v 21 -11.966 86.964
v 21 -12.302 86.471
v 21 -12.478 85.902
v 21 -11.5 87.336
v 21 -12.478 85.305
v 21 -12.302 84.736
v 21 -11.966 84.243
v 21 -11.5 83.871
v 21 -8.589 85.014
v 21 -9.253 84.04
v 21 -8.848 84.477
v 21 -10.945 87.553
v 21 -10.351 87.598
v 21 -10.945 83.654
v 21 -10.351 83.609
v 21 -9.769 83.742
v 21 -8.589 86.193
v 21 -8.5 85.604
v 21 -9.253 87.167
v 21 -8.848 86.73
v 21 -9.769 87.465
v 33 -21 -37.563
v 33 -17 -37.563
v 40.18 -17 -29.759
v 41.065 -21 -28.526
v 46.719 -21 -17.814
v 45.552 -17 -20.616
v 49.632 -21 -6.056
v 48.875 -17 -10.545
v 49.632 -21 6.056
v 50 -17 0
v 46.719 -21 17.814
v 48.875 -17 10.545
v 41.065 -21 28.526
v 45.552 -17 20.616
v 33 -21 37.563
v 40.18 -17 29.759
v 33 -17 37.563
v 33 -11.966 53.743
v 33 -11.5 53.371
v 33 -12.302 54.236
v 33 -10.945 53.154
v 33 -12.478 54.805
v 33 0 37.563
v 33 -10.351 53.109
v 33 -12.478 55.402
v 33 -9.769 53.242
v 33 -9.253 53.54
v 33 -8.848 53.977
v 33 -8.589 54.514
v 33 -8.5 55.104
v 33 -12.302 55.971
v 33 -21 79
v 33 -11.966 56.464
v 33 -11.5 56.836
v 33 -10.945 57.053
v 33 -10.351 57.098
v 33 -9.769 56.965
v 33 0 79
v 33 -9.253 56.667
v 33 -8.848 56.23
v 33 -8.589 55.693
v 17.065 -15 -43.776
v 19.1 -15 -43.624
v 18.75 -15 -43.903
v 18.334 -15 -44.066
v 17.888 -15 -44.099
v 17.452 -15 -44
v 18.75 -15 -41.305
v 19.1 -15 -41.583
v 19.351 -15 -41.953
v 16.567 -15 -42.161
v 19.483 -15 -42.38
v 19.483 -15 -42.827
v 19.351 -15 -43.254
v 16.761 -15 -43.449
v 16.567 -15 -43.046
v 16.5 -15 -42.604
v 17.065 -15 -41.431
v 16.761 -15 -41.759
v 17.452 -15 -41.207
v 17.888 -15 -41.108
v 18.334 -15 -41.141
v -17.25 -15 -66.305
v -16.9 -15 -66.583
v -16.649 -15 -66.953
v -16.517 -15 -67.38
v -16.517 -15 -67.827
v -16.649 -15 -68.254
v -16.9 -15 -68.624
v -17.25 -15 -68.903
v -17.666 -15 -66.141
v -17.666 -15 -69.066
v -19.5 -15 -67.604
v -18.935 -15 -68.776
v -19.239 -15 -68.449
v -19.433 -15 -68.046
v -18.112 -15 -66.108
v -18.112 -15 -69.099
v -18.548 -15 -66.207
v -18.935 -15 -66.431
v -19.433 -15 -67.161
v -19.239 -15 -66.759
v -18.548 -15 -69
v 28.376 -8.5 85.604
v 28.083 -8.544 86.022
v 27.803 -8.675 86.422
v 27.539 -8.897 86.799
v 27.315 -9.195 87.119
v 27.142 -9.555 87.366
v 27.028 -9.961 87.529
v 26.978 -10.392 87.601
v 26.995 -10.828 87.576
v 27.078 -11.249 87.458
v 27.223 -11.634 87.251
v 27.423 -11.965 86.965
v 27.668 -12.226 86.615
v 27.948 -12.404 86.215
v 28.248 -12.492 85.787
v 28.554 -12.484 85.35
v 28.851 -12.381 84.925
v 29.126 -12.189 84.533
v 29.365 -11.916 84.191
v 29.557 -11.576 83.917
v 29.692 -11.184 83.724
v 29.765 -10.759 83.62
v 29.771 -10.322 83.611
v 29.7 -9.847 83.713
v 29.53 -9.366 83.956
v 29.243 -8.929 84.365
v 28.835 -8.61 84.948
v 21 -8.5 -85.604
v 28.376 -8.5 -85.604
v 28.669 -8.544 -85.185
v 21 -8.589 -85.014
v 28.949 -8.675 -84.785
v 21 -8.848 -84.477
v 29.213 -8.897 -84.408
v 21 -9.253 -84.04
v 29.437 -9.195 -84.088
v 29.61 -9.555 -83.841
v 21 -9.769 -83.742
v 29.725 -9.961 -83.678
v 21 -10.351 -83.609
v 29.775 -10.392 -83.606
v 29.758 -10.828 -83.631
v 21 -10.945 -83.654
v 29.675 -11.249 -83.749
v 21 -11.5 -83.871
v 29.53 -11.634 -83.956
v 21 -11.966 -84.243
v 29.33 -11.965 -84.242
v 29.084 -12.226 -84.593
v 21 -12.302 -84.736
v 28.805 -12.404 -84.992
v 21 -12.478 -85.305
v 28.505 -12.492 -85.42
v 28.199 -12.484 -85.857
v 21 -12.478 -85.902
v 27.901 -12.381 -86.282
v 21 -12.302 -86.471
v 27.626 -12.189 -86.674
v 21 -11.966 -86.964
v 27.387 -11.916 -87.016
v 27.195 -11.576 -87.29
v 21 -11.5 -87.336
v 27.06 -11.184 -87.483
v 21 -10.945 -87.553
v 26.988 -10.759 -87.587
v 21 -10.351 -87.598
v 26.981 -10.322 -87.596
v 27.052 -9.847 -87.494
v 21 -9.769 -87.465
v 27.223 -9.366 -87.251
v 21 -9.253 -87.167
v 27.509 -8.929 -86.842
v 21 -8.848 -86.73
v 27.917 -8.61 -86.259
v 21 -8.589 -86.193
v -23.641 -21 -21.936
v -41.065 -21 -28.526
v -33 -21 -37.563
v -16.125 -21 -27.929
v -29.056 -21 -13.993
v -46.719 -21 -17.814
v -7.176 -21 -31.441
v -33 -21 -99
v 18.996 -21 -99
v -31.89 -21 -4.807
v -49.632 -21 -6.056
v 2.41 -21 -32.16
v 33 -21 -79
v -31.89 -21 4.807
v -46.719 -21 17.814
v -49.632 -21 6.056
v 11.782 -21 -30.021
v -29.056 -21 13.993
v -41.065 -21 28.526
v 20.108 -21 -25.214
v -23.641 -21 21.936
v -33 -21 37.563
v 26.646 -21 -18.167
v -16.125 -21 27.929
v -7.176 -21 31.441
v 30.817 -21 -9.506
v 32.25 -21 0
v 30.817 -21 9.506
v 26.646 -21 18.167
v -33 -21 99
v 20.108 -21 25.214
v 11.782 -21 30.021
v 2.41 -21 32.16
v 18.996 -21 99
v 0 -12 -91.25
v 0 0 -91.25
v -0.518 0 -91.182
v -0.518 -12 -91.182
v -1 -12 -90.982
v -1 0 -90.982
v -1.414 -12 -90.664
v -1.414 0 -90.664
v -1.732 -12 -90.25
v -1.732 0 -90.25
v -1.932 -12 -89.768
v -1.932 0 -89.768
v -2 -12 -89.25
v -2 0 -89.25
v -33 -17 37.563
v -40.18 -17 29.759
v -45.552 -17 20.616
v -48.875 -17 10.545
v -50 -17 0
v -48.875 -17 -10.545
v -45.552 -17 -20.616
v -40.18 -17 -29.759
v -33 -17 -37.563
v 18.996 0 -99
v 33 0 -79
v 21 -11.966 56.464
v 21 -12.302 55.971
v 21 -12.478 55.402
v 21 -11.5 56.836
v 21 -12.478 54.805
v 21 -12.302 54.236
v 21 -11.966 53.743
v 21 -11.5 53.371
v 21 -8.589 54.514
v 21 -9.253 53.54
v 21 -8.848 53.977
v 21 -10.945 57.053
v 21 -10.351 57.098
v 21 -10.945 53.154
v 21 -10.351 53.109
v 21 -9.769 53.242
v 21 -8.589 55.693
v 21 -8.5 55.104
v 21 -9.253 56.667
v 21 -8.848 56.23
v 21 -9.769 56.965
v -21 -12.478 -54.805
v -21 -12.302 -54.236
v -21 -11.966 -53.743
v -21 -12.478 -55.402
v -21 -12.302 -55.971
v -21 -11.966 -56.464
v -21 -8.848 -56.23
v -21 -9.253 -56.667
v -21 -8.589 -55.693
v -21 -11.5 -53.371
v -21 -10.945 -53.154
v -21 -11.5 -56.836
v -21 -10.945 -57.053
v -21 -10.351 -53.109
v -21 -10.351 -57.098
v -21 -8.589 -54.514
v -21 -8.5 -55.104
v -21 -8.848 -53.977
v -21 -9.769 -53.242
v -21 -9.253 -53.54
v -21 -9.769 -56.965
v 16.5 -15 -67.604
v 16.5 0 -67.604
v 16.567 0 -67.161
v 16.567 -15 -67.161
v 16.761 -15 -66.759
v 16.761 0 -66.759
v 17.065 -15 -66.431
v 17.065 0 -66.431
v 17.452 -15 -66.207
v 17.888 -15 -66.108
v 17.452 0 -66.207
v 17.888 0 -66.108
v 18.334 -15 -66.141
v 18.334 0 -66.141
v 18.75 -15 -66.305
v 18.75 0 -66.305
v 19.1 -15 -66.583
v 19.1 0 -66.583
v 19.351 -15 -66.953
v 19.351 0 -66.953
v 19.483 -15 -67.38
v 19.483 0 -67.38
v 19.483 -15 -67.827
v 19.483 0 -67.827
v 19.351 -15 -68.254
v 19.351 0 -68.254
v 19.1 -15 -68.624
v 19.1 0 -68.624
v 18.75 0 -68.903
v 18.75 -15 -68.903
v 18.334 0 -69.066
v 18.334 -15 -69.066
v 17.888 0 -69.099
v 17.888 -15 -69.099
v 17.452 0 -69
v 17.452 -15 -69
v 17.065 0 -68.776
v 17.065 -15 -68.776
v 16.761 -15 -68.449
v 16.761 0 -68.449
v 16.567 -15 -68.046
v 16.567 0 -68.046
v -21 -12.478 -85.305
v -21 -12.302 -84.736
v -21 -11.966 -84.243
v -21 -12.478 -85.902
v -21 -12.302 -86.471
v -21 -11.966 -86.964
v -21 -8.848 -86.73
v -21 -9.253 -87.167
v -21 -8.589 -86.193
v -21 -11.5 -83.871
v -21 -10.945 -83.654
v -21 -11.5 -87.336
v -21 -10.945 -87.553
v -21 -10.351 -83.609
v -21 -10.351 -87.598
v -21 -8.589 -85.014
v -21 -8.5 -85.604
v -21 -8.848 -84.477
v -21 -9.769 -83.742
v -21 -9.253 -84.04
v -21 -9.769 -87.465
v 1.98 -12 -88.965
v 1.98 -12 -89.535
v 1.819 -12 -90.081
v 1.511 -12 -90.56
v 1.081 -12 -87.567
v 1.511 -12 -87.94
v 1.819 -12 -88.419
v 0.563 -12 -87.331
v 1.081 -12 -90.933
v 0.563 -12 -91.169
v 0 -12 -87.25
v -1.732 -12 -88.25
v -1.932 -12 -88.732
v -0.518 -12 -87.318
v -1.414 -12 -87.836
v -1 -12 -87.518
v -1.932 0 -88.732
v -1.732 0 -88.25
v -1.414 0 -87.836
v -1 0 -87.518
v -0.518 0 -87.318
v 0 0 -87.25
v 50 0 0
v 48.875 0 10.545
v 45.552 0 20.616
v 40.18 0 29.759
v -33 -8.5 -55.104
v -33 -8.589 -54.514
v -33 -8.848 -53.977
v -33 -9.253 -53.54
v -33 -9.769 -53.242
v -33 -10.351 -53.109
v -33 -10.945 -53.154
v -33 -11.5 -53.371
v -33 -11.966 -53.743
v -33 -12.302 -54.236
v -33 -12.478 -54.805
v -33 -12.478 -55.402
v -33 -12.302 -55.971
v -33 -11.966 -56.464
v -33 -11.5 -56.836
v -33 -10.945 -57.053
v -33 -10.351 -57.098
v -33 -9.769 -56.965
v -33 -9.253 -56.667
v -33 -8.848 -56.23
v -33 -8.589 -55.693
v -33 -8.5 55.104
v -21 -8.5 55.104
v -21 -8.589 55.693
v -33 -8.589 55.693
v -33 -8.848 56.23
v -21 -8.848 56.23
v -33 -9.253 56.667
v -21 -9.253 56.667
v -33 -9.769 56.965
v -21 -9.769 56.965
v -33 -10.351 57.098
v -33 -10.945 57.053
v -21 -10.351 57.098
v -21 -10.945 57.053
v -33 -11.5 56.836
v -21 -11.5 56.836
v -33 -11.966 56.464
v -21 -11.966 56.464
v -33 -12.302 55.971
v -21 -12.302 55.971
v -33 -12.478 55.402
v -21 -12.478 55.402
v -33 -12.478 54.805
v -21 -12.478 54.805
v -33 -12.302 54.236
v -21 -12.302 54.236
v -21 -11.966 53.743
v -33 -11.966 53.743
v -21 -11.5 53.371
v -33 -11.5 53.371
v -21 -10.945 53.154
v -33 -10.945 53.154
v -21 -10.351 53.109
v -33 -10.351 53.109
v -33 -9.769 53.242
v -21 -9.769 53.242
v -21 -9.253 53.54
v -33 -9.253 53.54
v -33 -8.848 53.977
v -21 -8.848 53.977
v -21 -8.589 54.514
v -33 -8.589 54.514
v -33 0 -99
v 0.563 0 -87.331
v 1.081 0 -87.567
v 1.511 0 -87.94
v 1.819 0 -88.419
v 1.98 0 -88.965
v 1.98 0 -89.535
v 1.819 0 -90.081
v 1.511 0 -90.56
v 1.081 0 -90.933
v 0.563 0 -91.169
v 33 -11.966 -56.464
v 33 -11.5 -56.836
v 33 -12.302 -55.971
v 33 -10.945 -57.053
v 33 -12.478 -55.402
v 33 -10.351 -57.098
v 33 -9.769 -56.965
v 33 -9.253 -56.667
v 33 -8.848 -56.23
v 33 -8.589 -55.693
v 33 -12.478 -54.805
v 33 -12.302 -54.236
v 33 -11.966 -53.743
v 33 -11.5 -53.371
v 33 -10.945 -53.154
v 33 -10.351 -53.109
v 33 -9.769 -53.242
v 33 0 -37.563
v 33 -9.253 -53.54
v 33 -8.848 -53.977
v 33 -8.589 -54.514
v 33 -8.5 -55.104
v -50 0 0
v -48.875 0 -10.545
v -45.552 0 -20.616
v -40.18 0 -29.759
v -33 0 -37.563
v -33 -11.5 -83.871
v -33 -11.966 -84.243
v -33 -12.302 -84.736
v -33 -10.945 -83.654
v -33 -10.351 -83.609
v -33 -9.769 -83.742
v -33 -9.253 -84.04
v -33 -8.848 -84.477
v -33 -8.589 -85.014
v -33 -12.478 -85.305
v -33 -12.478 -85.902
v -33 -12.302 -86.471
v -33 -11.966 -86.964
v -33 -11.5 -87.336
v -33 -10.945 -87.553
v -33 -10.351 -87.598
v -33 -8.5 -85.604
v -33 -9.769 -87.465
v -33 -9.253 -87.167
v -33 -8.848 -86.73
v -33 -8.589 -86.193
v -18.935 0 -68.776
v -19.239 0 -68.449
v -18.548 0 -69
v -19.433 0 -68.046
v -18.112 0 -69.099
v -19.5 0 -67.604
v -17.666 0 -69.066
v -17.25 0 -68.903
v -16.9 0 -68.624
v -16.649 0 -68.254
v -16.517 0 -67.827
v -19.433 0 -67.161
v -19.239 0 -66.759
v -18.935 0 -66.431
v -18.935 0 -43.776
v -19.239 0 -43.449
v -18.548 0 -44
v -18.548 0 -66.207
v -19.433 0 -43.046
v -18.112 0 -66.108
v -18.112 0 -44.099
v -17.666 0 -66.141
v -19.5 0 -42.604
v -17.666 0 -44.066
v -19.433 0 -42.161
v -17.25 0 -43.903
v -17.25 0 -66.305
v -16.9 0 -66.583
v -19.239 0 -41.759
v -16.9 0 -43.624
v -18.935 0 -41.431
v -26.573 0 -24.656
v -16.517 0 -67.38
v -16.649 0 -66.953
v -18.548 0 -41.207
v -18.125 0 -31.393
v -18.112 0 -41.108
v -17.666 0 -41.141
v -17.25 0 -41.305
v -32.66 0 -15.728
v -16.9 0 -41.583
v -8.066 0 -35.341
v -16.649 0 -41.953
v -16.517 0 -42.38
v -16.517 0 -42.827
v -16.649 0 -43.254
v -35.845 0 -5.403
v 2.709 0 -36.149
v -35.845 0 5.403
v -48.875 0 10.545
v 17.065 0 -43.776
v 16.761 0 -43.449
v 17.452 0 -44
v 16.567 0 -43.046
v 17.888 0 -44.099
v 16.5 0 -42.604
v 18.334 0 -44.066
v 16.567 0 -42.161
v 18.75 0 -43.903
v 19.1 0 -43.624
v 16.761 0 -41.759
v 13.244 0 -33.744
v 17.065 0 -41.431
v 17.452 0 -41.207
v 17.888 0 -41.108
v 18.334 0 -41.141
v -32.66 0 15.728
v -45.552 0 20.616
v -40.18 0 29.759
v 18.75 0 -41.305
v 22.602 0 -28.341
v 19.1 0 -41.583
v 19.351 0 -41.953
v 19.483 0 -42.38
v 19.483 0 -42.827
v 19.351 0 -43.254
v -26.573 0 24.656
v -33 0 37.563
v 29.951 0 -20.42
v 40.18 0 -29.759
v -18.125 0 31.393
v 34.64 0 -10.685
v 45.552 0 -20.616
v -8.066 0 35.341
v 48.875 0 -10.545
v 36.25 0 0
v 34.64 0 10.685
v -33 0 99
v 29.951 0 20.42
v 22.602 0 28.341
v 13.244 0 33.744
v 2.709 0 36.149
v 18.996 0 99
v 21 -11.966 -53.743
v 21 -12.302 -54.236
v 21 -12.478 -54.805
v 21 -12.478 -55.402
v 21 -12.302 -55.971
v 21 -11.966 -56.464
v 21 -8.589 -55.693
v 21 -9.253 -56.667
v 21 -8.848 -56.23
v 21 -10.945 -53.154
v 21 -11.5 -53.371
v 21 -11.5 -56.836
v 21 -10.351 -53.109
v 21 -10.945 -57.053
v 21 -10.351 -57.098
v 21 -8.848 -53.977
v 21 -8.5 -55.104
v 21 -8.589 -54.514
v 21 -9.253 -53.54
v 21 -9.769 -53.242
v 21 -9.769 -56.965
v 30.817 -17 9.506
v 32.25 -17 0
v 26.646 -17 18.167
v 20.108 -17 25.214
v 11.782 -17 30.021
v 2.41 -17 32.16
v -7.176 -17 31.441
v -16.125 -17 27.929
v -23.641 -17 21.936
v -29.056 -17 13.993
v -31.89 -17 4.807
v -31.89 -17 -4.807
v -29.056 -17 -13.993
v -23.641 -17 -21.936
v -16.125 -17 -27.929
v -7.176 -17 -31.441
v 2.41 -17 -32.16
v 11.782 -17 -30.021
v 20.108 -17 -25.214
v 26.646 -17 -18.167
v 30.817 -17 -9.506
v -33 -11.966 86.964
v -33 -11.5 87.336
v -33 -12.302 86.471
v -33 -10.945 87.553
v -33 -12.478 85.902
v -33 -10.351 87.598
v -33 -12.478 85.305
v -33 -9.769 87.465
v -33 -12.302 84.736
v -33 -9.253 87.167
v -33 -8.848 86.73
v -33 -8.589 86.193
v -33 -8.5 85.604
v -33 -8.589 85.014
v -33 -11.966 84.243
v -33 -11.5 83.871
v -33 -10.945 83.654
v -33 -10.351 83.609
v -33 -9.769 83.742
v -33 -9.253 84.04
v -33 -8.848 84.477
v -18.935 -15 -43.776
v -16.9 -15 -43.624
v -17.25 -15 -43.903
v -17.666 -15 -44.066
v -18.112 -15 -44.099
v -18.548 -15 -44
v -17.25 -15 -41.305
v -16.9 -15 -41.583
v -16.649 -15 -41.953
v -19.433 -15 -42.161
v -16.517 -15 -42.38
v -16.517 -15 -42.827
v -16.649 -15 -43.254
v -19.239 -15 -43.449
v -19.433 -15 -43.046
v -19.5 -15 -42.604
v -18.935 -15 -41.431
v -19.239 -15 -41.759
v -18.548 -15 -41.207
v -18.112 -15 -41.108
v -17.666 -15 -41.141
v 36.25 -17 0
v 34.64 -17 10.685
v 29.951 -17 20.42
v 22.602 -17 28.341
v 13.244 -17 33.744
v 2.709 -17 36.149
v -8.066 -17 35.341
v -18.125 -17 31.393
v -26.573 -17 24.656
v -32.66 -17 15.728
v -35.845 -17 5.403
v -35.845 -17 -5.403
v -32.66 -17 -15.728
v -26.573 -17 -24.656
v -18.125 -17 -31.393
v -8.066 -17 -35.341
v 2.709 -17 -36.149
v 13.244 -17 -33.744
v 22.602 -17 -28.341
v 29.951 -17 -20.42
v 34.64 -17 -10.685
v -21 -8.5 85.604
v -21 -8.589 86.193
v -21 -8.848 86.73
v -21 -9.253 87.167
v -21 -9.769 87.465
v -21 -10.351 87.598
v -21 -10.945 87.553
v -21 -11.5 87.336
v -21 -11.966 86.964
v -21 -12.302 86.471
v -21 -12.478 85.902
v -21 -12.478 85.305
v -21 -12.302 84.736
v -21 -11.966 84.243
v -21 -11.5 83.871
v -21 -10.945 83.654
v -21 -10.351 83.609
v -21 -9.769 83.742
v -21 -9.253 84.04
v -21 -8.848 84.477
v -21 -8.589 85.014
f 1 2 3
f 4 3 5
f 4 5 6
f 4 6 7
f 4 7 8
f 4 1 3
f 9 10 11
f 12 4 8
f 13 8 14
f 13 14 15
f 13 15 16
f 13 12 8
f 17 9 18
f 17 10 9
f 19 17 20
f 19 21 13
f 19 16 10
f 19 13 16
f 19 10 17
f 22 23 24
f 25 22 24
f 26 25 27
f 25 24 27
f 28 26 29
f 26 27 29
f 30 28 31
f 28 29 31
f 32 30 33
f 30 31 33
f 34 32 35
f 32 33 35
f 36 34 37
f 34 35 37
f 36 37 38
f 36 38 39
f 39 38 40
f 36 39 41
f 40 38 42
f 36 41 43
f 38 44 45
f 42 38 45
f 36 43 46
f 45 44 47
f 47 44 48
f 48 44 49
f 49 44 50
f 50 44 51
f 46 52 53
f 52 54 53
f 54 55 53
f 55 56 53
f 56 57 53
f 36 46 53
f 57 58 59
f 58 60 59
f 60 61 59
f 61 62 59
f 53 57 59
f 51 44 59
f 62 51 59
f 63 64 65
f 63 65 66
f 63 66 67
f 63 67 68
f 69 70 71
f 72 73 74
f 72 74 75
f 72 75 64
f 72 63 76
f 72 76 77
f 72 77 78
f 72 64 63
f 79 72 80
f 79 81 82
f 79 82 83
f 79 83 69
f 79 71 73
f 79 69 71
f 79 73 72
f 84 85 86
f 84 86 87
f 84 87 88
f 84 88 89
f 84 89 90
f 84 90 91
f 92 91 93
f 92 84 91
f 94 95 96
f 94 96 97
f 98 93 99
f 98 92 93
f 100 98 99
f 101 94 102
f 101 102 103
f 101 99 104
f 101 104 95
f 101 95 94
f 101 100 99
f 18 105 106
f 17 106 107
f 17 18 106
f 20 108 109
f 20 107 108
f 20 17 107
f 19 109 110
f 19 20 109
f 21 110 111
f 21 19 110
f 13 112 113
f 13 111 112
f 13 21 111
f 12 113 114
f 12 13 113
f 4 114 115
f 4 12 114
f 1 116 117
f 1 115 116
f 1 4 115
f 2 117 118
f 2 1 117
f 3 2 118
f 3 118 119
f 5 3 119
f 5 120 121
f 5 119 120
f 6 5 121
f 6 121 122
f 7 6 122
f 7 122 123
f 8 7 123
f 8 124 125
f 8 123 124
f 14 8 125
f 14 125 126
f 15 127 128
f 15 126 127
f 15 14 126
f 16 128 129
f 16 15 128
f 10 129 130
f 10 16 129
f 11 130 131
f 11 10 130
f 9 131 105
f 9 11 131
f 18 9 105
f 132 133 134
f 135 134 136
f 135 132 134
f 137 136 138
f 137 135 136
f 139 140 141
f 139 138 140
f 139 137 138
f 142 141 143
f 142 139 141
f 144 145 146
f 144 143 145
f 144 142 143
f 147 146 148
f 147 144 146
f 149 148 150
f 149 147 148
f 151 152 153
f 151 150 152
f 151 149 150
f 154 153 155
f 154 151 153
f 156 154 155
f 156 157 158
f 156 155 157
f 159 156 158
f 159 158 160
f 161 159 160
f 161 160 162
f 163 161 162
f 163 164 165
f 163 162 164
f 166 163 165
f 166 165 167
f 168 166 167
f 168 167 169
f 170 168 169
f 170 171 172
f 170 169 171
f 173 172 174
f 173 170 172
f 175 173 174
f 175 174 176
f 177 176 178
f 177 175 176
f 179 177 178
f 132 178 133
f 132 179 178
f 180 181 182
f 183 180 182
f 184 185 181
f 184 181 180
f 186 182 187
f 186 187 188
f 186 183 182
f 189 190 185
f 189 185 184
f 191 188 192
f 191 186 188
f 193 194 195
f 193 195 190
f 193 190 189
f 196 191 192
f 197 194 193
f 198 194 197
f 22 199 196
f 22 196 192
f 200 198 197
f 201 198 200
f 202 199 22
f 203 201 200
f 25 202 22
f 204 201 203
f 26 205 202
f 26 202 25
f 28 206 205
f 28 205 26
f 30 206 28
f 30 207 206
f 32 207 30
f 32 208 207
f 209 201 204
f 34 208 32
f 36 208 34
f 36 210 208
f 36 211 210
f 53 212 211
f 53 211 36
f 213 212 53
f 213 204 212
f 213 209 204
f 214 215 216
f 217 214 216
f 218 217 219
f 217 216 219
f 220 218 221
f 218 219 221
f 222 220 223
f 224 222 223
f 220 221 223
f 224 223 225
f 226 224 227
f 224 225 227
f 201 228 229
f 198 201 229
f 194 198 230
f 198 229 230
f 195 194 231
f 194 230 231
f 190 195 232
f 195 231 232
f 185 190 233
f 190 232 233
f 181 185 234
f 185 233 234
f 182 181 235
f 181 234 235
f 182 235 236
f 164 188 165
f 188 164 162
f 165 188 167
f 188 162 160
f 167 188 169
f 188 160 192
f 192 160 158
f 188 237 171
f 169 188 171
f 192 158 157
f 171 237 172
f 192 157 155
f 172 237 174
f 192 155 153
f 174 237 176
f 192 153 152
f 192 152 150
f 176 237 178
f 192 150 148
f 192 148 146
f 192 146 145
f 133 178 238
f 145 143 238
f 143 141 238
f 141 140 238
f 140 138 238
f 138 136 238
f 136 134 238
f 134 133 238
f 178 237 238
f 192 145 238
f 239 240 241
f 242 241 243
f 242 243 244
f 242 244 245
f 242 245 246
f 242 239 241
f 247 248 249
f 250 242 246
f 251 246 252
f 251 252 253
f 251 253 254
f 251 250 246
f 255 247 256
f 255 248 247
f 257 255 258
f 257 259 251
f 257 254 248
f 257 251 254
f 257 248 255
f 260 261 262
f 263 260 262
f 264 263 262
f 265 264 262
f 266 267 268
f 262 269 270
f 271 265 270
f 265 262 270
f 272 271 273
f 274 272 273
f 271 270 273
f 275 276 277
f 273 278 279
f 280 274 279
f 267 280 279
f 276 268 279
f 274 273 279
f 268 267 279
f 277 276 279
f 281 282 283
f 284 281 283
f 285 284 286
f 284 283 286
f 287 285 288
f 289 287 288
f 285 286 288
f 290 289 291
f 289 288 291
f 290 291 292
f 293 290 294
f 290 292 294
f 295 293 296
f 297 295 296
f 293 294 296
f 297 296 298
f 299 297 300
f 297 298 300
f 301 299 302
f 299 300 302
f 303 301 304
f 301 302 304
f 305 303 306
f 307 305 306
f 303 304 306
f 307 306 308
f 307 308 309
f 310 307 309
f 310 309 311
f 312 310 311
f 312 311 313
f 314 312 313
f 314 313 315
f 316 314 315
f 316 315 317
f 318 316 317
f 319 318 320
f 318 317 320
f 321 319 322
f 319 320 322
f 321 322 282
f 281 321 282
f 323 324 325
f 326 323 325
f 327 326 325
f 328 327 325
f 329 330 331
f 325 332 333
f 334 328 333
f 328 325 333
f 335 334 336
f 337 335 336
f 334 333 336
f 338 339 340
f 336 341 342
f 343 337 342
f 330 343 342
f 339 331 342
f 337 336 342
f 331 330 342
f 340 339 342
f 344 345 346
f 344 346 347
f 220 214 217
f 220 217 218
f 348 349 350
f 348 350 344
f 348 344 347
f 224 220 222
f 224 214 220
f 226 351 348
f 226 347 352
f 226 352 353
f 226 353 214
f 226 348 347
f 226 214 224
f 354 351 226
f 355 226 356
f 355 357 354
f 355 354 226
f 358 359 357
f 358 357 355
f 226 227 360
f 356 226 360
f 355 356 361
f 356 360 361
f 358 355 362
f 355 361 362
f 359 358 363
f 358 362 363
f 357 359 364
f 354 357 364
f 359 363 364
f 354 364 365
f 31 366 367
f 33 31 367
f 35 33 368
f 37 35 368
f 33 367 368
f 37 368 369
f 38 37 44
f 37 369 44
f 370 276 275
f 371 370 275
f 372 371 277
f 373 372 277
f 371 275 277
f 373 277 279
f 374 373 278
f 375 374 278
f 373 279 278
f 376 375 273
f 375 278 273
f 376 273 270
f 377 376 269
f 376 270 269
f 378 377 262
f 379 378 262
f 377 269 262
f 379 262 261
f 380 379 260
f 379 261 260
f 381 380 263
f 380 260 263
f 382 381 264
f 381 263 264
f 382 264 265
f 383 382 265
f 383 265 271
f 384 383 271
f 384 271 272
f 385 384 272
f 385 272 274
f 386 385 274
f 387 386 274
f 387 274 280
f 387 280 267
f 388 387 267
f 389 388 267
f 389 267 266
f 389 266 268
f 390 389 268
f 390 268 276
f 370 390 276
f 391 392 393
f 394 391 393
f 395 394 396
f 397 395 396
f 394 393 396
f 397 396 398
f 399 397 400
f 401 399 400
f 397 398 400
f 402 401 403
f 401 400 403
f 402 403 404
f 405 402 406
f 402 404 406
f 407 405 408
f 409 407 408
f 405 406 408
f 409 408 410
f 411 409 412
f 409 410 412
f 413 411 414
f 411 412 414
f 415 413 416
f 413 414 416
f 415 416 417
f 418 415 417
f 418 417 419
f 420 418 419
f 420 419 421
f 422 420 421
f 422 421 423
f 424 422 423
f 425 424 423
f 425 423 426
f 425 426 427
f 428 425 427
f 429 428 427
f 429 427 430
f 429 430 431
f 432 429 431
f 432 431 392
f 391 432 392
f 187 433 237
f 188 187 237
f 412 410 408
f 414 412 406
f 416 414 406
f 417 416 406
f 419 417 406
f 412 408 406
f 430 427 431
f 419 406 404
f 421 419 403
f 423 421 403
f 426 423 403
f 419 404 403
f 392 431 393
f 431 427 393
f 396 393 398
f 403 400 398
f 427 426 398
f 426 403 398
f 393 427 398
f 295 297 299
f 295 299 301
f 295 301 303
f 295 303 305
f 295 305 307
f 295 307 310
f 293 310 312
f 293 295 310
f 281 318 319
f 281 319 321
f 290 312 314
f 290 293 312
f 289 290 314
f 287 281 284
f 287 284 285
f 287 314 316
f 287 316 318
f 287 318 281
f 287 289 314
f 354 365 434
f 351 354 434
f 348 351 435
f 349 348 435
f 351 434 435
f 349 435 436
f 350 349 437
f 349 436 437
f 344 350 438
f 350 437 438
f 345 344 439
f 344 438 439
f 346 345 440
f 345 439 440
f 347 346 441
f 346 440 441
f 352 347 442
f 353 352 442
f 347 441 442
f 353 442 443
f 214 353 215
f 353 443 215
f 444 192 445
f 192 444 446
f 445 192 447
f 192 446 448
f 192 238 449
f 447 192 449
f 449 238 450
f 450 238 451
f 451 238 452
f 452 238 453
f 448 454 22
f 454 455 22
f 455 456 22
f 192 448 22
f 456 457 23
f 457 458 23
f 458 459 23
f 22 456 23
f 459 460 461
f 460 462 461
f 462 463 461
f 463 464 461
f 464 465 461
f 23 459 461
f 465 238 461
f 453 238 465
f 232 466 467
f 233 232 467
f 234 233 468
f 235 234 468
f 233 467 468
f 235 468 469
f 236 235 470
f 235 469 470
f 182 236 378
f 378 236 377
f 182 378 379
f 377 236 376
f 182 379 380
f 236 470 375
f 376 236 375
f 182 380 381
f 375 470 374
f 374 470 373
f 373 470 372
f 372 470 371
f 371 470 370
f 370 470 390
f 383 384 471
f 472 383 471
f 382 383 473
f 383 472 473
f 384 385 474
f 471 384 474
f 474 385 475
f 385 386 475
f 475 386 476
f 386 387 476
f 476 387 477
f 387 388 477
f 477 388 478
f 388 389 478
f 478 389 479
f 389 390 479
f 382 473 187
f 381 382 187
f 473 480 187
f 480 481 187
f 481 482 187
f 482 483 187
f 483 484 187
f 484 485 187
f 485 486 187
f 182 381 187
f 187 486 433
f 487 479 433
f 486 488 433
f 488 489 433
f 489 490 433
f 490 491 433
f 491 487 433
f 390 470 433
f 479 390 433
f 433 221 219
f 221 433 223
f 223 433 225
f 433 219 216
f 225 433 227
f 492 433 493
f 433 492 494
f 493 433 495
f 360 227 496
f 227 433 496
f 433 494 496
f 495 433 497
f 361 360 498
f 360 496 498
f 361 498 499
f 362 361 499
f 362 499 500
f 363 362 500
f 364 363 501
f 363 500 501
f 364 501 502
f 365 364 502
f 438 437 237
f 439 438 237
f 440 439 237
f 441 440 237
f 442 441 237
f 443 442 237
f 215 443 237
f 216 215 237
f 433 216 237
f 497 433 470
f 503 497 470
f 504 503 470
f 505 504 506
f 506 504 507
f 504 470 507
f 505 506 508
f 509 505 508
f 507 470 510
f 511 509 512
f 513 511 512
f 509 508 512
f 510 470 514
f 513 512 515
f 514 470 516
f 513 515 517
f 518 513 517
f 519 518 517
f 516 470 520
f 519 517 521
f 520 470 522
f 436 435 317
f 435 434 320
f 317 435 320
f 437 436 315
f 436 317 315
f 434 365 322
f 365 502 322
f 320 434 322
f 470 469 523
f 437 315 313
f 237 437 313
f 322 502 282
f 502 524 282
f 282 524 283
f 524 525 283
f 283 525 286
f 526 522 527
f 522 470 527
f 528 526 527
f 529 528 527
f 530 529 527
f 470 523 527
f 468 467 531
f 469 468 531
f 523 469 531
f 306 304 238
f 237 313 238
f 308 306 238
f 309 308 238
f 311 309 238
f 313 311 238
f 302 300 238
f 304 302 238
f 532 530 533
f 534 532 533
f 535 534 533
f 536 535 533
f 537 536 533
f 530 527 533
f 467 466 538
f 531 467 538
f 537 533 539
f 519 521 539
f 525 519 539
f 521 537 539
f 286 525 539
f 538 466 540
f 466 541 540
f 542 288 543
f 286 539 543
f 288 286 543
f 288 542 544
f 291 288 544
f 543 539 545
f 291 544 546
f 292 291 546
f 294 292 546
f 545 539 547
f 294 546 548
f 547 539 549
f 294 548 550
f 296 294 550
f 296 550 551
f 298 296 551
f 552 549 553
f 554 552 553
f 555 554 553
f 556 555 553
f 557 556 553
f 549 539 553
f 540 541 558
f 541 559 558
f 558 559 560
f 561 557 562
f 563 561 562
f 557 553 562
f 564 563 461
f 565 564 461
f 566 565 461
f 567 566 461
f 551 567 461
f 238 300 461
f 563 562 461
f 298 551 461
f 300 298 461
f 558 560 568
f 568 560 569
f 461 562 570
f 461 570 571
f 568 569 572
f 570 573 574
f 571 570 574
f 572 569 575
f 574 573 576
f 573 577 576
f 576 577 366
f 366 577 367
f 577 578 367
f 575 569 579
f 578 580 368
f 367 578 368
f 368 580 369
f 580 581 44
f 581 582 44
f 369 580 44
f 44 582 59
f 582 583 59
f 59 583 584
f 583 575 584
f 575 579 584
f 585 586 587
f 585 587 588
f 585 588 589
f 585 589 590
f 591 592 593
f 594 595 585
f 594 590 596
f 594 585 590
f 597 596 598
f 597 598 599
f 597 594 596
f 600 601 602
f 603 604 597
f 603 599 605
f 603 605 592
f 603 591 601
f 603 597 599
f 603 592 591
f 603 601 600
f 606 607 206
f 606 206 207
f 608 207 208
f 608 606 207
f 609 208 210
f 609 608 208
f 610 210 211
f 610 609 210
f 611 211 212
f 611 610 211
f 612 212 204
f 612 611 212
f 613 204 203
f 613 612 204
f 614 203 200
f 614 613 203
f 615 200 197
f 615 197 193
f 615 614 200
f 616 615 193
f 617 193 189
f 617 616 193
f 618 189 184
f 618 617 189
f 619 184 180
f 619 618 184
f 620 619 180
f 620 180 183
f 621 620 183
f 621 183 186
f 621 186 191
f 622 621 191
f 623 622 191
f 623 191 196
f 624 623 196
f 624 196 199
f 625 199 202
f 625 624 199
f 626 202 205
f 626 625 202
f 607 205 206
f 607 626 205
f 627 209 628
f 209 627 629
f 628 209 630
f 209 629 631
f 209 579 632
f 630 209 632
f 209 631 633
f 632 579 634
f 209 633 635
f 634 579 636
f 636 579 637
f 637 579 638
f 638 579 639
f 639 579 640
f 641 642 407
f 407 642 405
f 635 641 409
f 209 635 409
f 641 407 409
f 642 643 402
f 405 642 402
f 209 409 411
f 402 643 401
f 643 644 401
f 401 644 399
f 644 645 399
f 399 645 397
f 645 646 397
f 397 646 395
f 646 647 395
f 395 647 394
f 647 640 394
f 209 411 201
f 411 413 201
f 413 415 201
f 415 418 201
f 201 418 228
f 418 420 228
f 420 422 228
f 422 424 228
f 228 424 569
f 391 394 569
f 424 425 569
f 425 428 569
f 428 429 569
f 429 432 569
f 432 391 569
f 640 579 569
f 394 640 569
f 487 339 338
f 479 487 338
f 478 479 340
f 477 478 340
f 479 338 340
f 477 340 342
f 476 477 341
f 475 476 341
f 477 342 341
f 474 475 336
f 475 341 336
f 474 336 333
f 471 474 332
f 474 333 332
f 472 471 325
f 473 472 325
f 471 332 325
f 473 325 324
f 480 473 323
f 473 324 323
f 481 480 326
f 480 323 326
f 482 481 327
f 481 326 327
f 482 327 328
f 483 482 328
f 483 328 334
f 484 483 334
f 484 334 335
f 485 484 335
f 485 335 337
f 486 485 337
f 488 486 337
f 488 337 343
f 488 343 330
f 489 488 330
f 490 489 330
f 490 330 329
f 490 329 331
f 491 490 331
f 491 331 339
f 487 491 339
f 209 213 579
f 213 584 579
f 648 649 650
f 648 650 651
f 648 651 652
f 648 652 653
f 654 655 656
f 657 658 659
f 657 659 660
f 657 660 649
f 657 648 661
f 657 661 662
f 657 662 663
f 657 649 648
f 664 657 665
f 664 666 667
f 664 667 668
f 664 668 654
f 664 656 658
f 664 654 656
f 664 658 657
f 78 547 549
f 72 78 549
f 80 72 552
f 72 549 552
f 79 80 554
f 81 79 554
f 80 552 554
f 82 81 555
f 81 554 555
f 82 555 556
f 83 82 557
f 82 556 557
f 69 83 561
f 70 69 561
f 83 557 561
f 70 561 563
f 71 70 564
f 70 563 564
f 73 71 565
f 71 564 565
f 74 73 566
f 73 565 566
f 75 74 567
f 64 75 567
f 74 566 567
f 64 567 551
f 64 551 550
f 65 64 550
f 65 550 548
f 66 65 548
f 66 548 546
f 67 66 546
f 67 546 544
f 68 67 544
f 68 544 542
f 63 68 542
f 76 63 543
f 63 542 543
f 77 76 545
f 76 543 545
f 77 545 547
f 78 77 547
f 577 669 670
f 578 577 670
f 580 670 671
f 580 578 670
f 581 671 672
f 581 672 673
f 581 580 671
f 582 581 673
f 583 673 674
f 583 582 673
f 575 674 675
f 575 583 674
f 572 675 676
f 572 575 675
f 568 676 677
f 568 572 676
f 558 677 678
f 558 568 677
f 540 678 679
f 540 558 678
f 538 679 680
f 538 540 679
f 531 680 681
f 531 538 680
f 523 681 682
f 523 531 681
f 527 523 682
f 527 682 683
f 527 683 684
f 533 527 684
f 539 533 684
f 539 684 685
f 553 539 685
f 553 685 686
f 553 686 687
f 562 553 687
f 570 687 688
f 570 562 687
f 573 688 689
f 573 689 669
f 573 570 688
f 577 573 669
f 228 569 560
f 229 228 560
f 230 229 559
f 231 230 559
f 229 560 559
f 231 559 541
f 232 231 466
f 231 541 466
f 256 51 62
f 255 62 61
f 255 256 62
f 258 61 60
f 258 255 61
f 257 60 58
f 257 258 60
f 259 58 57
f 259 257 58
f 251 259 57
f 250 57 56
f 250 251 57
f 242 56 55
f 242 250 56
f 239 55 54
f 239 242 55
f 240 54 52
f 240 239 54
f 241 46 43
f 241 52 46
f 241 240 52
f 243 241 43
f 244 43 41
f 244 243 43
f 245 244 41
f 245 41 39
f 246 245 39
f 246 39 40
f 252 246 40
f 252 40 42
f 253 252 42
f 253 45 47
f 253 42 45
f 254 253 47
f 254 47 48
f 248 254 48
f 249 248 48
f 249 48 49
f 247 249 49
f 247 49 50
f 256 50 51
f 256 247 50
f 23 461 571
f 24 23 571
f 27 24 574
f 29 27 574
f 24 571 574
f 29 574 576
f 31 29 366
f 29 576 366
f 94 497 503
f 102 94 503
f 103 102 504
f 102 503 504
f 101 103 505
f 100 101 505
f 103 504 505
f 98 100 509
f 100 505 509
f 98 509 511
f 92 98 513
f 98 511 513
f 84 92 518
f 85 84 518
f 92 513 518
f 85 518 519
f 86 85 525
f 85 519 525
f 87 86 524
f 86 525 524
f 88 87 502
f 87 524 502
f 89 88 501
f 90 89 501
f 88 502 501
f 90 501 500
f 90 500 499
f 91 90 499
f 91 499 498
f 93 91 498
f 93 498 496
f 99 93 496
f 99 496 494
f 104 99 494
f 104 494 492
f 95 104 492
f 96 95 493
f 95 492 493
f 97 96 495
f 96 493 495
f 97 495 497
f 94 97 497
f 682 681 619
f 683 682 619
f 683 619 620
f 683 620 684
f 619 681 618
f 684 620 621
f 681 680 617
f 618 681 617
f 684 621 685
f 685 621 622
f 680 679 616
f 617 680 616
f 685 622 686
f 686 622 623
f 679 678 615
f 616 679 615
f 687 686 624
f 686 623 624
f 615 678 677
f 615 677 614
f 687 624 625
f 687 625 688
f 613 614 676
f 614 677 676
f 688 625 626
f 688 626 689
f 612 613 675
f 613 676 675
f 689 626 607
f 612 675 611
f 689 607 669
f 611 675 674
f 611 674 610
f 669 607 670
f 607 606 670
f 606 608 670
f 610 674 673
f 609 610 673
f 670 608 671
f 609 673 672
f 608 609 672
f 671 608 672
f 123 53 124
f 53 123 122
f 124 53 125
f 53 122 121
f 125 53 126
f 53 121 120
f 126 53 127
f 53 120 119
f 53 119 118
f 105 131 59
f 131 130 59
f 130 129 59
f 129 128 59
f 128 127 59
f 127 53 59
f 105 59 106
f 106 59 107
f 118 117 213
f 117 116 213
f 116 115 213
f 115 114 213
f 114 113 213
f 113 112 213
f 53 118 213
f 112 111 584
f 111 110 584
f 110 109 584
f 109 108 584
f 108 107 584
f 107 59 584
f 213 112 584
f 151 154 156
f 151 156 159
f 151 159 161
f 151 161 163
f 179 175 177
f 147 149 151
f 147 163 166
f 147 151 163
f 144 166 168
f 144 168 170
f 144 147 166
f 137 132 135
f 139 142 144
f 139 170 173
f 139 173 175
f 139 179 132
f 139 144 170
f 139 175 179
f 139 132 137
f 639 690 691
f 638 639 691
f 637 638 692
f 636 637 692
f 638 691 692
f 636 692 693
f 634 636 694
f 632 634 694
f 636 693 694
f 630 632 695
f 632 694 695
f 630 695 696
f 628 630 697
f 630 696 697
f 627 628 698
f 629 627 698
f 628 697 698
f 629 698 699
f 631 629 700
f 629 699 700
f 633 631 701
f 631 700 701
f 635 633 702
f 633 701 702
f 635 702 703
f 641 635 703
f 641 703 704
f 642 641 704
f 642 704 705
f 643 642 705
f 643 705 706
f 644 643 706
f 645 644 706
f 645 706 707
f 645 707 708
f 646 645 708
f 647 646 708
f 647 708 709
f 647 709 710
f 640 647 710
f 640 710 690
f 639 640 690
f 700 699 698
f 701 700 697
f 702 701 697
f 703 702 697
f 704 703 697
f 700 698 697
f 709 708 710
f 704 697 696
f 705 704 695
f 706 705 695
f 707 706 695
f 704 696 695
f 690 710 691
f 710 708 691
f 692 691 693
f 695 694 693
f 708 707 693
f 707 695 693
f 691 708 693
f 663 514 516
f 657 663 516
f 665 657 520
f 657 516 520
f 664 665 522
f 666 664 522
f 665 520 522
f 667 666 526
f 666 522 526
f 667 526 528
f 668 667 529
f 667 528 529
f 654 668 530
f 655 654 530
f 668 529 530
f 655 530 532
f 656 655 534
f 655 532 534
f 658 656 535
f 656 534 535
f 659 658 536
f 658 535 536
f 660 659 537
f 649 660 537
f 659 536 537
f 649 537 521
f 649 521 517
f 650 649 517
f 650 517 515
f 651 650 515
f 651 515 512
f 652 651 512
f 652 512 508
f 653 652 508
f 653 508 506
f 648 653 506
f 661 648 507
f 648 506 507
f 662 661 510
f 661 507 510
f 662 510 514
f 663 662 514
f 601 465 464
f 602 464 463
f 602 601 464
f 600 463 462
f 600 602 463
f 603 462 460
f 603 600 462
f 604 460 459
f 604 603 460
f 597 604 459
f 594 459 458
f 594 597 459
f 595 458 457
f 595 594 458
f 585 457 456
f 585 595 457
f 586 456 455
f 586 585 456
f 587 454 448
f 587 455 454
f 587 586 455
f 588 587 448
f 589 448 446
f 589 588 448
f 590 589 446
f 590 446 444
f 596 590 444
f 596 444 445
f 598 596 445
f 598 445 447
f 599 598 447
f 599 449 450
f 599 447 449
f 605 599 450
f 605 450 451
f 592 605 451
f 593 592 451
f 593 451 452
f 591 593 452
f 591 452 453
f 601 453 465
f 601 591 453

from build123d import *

# Parameters (mm, degrees)
F0_R      = 36.25
F1_DEPTH  = 17
F2_R      = 32.25
F3_DEPTH  = 4
F4_R      = 1.5
F5_DEPTH  = 15
F7_R      = 2
F8_DEPTH  = 25
F10_R     = 2
F11_DEPTH = 25
F13_DEPTH = 12


with BuildPart() as f1:
    # F0 (on Front) → F1 (new body)
    with BuildSketch(Plane.XZ):
        Circle(F0_R)
        with BuildLine():
            Line((-33, -99), (-18.995849, -99))
            Line((-18.995849, -99), (0, -99))
            Line((0, -99), (18.995849, -99))
            Line((18.995849, -99), (33, -79))
            Line((33, -79), (33, -37.56328))
            ThreePointArc((33, -37.56328), (45.552168, -20.615528), (50, 0))
            ThreePointArc((50, 0), (45.552168, 20.615528), (33, 37.56328))
            Line((33, 37.56328), (33, 79))
            Line((33, 79), (18.995849, 99))
            Line((18.995849, 99), (-18.995849, 99))
            Line((-18.995849, 99), (-33, 99))
            Line((-33, 99), (-33, 79))
            Line((-33, 79), (-33, 37.56328))
            ThreePointArc((-33, 37.56328), (-45.552168, 20.615528), (-50, 0))
            ThreePointArc((-50, 0), (-45.552168, -20.615528), (-33, -37.56328))
            Line((-33, -37.56328), (-33, -79))
            Line((-33, -79), (-33, -99))
        make_face()
        Circle(F0_R, mode=Mode.SUBTRACT)
    extrude(amount=F1_DEPTH)

    # F2 (on face) → F3 (join)
    with BuildSketch(Plane.XZ.offset(17)):
        with BuildLine():
            Line((33, -79), (33, -37.56328))
            ThreePointArc((33, -37.56328), (50, 0), (33, 37.56328))
            Line((33, 37.56328), (33, 79))
            Line((33, 79), (18.995849, 99))
            Line((18.995849, 99), (-33, 99))
            Line((-33, 99), (-33, 37.56328))
            ThreePointArc((-33, 37.56328), (-50, 0), (-33, -37.56328))
            Line((-33, -37.56328), (-33, -99))
            Line((-33, -99), (18.995849, -99))
            Line((18.995849, -99), (33, -79))
        make_face()
        Circle(F2_R, mode=Mode.SUBTRACT)
    extrude(amount=F3_DEPTH)

    # F4 (on face) → F5 (cut)
    with BuildSketch(Plane(origin=(0, 0, 0), x_dir=(-1, 0, 0), z_dir=(0, 1, 0))):
        with Locations((-18, -42.60355)):
            Circle(F4_R)
        with Locations((18, -42.60355)):
            Circle(F4_R)
        with Locations((18, -67.60355)):
            Circle(F4_R)
        with Locations((-18, -67.60355)):
            Circle(F4_R)
    extrude(amount=-F5_DEPTH, mode=Mode.SUBTRACT)

    # F7 (on offset) → F8 (cut)
    with BuildSketch(Plane.YZ.offset(21)):
        with BuildLine():
            ThreePointArc((-12.5, -85.60355), (-10.5, -87.60355), (-8.5, -85.60355))
            Line((-8.5, -85.60355), (-12.5, -85.60355))
        make_face()
        with BuildLine():
            Line((-12.5, -85.60355), (-8.5, -85.60355))
            ThreePointArc((-8.5, -85.60355), (-10.5, -83.60355), (-12.5, -85.60355))
        make_face()
        with BuildLine():
            ThreePointArc((-12.5, -55.10355), (-10.5, -57.10355), (-8.5, -55.10355))
            Line((-8.5, -55.10355), (-12.5, -55.10355))
        make_face()
        with BuildLine():
            Line((-12.5, -55.10355), (-8.5, -55.10355))
            ThreePointArc((-8.5, -55.10355), (-10.5, -53.10355), (-12.5, -55.10355))
        make_face()
        with Locations((-10.5, 55.10355)):
            Circle(F7_R)
        with Locations((-10.5, 85.60355)):
            Circle(F7_R)
    extrude(amount=F8_DEPTH, mode=Mode.SUBTRACT)

    # F10 (on offset) → F11 (cut)
    with BuildSketch(Plane.YZ.offset(-21)):
        with BuildLine():
            ThreePointArc((-12.5, -85.60355), (-10.5, -87.60355), (-8.5, -85.60355))
            Line((-8.5, -85.60355), (-12.5, -85.60355))
        make_face()
        with BuildLine():
            Line((-12.5, -85.60355), (-8.5, -85.60355))
            ThreePointArc((-8.5, -85.60355), (-10.5, -83.60355), (-12.5, -85.60355))
        make_face()
        with BuildLine():
            ThreePointArc((-12.5, -55.10355), (-10.5, -57.10355), (-8.5, -55.10355))
            Line((-8.5, -55.10355), (-12.5, -55.10355))
        make_face()
        with BuildLine():
            Line((-12.5, -55.10355), (-8.5, -55.10355))
            ThreePointArc((-8.5, -55.10355), (-10.5, -53.10355), (-12.5, -55.10355))
        make_face()
        with Locations((-10.5, 55.10355)):
            Circle(F10_R)
        with Locations((-10.5, 85.60355)):
            Circle(F10_R)
    extrude(amount=-F11_DEPTH, mode=Mode.SUBTRACT)

    # F12 (on face) → F13 (cut)
    with BuildSketch(Plane(origin=(0, 0, 0), x_dir=(-1, 0, 0), z_dir=(0, 1, 0))):
        with BuildLine():
            ThreePointArc((0, -87.25), (-2, -89.25), (0, -91.25))
            Line((0, -91.25), (0, -87.25))
        make_face()
        with BuildLine():
            Line((0, -87.25), (0, -91.25))
            ThreePointArc((0, -91.25), (1.414214, -90.664214), (2, -89.25))
            ThreePointArc((2, -89.25), (1.414214, -87.835786), (0, -87.25))
        make_face()
    extrude(amount=-F13_DEPTH, mode=Mode.SUBTRACT)


solid = f1.part
